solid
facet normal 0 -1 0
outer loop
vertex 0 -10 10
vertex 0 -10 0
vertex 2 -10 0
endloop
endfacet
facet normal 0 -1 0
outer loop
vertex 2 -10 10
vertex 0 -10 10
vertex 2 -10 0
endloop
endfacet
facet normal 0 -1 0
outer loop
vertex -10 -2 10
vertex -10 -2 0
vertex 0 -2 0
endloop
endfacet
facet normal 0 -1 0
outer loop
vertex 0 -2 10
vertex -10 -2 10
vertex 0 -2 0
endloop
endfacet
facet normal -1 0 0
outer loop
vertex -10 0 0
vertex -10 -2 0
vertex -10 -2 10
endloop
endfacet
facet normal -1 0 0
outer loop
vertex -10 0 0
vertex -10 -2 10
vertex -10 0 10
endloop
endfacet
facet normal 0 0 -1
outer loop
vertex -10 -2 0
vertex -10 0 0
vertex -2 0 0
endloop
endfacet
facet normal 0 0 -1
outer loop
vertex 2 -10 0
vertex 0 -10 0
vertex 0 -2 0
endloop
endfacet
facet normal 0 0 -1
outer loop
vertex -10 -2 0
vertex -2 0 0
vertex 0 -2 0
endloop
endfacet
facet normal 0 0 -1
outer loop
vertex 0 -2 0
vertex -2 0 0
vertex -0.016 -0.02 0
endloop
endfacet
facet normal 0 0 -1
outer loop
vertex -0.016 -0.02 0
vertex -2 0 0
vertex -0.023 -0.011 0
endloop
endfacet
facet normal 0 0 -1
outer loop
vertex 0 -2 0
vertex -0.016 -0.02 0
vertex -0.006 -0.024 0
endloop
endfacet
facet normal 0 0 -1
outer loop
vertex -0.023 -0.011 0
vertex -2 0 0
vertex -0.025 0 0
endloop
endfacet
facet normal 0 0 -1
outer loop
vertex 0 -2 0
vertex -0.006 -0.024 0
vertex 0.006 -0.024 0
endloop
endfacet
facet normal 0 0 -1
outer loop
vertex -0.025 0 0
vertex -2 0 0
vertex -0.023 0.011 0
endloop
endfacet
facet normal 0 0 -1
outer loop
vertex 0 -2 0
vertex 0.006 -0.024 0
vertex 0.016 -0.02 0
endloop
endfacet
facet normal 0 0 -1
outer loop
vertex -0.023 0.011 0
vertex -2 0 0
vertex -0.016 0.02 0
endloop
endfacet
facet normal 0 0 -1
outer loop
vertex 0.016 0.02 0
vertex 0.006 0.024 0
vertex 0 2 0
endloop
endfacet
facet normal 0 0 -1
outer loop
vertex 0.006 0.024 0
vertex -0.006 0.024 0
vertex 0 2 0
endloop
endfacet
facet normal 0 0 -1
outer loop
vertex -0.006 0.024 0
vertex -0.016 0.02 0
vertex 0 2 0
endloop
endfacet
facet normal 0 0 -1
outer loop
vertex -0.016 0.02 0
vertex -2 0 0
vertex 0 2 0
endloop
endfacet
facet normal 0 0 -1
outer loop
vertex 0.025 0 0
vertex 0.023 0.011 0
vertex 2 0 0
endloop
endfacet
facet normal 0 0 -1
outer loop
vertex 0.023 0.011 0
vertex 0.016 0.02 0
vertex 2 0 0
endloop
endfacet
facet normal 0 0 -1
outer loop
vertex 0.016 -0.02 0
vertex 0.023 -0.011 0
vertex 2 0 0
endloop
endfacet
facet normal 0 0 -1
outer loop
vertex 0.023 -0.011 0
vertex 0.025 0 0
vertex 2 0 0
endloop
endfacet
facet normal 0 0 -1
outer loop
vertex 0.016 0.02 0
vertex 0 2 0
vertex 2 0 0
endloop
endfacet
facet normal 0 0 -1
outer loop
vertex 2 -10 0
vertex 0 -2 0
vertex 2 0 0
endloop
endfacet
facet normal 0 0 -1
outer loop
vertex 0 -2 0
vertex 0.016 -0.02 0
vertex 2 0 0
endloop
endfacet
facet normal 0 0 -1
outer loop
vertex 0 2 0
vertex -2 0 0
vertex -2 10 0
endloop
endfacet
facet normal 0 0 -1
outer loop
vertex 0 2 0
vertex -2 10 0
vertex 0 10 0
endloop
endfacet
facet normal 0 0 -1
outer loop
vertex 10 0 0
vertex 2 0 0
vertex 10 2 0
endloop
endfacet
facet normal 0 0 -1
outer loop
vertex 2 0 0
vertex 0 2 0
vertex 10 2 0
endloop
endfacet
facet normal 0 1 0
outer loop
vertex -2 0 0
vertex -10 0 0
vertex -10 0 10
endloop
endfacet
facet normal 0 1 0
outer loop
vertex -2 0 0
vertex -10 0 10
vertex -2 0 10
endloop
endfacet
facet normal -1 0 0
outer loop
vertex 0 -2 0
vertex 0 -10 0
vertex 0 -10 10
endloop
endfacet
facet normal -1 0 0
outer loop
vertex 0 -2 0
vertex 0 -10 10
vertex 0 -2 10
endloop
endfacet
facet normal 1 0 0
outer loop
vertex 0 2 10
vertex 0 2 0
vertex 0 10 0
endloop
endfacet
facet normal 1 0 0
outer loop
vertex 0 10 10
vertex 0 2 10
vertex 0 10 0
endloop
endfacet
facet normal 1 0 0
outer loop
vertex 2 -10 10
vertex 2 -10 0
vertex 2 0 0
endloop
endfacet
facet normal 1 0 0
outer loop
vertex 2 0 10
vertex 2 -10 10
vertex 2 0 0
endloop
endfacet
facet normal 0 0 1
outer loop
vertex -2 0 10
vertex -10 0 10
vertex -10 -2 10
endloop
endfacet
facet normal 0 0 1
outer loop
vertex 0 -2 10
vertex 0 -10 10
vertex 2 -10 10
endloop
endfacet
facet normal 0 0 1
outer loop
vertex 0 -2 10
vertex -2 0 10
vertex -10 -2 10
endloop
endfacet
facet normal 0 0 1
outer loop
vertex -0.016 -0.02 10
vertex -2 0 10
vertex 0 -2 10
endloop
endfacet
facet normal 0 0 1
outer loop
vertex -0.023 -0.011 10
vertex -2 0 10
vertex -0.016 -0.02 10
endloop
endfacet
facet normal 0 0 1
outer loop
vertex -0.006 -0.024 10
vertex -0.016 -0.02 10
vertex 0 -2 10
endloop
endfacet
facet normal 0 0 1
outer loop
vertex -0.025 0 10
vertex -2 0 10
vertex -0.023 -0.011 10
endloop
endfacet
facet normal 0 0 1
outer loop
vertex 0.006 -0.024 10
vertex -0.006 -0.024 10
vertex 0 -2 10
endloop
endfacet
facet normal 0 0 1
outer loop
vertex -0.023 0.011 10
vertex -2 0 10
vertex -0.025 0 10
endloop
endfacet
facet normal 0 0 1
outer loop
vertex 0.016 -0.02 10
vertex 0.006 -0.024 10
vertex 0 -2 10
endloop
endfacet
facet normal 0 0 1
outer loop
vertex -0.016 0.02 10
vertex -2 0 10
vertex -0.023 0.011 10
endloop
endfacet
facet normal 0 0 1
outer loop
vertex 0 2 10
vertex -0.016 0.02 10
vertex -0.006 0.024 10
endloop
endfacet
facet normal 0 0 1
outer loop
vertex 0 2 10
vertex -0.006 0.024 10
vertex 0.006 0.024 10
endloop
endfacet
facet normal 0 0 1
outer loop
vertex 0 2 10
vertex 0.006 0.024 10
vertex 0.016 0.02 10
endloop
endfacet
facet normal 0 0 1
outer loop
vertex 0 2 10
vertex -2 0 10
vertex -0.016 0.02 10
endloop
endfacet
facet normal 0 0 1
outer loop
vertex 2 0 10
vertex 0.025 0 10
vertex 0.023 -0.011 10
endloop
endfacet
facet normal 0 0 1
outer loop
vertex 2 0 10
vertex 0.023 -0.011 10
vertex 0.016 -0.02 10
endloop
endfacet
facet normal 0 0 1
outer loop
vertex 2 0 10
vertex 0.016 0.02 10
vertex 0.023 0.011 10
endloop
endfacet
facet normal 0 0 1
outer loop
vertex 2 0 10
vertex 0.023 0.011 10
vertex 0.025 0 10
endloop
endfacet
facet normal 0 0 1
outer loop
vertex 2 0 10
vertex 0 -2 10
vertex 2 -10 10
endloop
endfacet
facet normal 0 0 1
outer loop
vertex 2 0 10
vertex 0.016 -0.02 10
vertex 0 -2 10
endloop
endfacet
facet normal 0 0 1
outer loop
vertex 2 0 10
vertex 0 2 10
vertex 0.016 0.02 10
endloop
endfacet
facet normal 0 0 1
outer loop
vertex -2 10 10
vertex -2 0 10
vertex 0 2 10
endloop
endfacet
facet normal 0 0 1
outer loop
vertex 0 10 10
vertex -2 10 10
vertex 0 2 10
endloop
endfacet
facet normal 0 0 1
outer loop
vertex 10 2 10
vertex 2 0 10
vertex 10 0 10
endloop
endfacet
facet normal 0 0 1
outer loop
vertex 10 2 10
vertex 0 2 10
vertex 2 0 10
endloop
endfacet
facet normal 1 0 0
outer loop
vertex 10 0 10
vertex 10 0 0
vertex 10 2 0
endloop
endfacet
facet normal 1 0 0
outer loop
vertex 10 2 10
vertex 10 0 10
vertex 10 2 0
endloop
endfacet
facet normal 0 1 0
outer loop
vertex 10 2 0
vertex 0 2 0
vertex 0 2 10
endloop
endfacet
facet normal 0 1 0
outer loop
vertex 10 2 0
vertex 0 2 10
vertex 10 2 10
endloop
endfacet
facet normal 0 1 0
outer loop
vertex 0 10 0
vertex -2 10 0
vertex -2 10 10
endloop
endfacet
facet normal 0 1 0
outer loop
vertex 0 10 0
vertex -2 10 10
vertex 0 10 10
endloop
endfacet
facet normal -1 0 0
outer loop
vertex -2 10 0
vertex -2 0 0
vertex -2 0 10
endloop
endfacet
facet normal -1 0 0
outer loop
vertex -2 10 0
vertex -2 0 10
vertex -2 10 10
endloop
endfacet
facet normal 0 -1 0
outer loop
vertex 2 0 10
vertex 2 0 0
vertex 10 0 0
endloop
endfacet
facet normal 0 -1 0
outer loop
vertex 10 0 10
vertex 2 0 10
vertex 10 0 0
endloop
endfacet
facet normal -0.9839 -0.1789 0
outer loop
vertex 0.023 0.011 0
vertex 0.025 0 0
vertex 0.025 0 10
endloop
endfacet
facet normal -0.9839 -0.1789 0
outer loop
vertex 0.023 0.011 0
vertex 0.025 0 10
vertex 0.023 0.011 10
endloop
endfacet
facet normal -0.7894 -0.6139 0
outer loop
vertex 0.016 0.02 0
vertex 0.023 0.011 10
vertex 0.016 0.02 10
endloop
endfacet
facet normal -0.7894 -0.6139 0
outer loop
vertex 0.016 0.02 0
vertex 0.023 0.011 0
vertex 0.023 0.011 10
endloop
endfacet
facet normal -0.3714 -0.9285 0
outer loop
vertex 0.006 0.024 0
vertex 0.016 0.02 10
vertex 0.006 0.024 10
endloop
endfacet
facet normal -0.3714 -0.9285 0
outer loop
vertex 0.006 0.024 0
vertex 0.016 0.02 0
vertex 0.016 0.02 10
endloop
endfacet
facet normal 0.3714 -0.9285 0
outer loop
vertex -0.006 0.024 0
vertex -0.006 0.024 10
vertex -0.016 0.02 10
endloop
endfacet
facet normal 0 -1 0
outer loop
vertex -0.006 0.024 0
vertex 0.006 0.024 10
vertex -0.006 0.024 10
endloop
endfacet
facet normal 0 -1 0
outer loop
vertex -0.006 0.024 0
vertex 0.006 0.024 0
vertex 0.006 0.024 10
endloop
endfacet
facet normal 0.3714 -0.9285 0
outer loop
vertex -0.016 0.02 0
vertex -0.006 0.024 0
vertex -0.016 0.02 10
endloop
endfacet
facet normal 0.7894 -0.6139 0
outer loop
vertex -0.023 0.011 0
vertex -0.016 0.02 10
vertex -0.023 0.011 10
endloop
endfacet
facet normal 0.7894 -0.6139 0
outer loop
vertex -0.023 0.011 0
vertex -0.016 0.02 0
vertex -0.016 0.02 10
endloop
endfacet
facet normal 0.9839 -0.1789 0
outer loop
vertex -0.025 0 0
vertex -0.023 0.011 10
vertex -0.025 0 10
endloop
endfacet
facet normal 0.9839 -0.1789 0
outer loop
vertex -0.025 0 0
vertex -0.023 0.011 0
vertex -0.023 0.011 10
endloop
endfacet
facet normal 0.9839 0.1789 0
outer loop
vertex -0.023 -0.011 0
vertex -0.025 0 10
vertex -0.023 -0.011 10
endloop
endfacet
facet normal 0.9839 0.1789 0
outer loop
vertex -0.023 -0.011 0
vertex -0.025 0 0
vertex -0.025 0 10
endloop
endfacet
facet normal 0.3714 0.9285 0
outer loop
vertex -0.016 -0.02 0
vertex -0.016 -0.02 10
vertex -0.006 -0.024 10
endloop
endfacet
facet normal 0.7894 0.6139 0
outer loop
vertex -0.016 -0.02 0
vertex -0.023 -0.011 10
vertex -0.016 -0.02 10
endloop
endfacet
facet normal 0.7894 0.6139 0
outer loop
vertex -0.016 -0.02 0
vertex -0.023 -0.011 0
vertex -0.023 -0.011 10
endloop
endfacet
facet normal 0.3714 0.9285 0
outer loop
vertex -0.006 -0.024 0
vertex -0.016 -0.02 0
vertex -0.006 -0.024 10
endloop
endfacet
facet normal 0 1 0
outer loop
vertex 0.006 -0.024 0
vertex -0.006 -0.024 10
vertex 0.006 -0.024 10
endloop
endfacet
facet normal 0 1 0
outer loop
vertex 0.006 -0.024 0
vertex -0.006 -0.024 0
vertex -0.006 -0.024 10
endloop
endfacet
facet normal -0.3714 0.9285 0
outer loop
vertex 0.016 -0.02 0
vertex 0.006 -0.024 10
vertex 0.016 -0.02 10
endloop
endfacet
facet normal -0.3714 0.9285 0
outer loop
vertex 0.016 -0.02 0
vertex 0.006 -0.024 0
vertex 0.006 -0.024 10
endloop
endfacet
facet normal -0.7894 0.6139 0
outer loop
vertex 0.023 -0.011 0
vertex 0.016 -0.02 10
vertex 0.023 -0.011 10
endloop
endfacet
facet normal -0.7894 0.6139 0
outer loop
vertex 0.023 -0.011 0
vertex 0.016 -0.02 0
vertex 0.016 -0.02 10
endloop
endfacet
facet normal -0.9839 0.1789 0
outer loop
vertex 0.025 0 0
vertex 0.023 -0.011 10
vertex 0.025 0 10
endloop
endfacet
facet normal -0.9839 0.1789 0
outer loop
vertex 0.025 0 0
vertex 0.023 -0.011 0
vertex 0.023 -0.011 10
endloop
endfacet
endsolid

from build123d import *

# Parameters (mm, degrees)
SKETCH_W             = 20
SKETCH_H             = 20
PAD_DEPTH            = 10
SKETCH001_W          = 15
SKETCH001_H          = 15
POCKET_DEPTH         = 10.001
SKETCH002_R          = 0.025
POCKET001_DEPTH      = 0.001
POCKET001_DEPTH_BACK = 10.001


with BuildPart() as part:
    # Sketch → Pad (new body)
    with BuildSketch(Plane.XY):
        Rectangle(SKETCH_W, SKETCH_H)
    extrude(amount=PAD_DEPTH)

    # Sketch001 → Pocket (cut, through all)
    with BuildSketch(Plane.XY):
        with Locations((7.5, 9.5)):
            Rectangle(SKETCH001_W, SKETCH001_H)
        with Locations((-9.5, 7.5)):
            Rectangle(SKETCH001_W, SKETCH001_H)
        with Locations((9.5, -7.5)):
            Rectangle(SKETCH001_W, SKETCH001_H)
        with Locations((-7.5, -9.5)):
            Rectangle(SKETCH001_W, SKETCH001_H)
    extrude(amount=POCKET_DEPTH, mode=Mode.SUBTRACT)

    # Sketch002 → Pocket001 (cut, two sides)
    with BuildSketch(Plane.XY) as pocket001_sk:
        Circle(SKETCH002_R)
    extrude(amount=-POCKET001_DEPTH, mode=Mode.SUBTRACT)
    extrude(pocket001_sk.sketch, amount=POCKET001_DEPTH_BACK, mode=Mode.SUBTRACT)


solid = part.part
